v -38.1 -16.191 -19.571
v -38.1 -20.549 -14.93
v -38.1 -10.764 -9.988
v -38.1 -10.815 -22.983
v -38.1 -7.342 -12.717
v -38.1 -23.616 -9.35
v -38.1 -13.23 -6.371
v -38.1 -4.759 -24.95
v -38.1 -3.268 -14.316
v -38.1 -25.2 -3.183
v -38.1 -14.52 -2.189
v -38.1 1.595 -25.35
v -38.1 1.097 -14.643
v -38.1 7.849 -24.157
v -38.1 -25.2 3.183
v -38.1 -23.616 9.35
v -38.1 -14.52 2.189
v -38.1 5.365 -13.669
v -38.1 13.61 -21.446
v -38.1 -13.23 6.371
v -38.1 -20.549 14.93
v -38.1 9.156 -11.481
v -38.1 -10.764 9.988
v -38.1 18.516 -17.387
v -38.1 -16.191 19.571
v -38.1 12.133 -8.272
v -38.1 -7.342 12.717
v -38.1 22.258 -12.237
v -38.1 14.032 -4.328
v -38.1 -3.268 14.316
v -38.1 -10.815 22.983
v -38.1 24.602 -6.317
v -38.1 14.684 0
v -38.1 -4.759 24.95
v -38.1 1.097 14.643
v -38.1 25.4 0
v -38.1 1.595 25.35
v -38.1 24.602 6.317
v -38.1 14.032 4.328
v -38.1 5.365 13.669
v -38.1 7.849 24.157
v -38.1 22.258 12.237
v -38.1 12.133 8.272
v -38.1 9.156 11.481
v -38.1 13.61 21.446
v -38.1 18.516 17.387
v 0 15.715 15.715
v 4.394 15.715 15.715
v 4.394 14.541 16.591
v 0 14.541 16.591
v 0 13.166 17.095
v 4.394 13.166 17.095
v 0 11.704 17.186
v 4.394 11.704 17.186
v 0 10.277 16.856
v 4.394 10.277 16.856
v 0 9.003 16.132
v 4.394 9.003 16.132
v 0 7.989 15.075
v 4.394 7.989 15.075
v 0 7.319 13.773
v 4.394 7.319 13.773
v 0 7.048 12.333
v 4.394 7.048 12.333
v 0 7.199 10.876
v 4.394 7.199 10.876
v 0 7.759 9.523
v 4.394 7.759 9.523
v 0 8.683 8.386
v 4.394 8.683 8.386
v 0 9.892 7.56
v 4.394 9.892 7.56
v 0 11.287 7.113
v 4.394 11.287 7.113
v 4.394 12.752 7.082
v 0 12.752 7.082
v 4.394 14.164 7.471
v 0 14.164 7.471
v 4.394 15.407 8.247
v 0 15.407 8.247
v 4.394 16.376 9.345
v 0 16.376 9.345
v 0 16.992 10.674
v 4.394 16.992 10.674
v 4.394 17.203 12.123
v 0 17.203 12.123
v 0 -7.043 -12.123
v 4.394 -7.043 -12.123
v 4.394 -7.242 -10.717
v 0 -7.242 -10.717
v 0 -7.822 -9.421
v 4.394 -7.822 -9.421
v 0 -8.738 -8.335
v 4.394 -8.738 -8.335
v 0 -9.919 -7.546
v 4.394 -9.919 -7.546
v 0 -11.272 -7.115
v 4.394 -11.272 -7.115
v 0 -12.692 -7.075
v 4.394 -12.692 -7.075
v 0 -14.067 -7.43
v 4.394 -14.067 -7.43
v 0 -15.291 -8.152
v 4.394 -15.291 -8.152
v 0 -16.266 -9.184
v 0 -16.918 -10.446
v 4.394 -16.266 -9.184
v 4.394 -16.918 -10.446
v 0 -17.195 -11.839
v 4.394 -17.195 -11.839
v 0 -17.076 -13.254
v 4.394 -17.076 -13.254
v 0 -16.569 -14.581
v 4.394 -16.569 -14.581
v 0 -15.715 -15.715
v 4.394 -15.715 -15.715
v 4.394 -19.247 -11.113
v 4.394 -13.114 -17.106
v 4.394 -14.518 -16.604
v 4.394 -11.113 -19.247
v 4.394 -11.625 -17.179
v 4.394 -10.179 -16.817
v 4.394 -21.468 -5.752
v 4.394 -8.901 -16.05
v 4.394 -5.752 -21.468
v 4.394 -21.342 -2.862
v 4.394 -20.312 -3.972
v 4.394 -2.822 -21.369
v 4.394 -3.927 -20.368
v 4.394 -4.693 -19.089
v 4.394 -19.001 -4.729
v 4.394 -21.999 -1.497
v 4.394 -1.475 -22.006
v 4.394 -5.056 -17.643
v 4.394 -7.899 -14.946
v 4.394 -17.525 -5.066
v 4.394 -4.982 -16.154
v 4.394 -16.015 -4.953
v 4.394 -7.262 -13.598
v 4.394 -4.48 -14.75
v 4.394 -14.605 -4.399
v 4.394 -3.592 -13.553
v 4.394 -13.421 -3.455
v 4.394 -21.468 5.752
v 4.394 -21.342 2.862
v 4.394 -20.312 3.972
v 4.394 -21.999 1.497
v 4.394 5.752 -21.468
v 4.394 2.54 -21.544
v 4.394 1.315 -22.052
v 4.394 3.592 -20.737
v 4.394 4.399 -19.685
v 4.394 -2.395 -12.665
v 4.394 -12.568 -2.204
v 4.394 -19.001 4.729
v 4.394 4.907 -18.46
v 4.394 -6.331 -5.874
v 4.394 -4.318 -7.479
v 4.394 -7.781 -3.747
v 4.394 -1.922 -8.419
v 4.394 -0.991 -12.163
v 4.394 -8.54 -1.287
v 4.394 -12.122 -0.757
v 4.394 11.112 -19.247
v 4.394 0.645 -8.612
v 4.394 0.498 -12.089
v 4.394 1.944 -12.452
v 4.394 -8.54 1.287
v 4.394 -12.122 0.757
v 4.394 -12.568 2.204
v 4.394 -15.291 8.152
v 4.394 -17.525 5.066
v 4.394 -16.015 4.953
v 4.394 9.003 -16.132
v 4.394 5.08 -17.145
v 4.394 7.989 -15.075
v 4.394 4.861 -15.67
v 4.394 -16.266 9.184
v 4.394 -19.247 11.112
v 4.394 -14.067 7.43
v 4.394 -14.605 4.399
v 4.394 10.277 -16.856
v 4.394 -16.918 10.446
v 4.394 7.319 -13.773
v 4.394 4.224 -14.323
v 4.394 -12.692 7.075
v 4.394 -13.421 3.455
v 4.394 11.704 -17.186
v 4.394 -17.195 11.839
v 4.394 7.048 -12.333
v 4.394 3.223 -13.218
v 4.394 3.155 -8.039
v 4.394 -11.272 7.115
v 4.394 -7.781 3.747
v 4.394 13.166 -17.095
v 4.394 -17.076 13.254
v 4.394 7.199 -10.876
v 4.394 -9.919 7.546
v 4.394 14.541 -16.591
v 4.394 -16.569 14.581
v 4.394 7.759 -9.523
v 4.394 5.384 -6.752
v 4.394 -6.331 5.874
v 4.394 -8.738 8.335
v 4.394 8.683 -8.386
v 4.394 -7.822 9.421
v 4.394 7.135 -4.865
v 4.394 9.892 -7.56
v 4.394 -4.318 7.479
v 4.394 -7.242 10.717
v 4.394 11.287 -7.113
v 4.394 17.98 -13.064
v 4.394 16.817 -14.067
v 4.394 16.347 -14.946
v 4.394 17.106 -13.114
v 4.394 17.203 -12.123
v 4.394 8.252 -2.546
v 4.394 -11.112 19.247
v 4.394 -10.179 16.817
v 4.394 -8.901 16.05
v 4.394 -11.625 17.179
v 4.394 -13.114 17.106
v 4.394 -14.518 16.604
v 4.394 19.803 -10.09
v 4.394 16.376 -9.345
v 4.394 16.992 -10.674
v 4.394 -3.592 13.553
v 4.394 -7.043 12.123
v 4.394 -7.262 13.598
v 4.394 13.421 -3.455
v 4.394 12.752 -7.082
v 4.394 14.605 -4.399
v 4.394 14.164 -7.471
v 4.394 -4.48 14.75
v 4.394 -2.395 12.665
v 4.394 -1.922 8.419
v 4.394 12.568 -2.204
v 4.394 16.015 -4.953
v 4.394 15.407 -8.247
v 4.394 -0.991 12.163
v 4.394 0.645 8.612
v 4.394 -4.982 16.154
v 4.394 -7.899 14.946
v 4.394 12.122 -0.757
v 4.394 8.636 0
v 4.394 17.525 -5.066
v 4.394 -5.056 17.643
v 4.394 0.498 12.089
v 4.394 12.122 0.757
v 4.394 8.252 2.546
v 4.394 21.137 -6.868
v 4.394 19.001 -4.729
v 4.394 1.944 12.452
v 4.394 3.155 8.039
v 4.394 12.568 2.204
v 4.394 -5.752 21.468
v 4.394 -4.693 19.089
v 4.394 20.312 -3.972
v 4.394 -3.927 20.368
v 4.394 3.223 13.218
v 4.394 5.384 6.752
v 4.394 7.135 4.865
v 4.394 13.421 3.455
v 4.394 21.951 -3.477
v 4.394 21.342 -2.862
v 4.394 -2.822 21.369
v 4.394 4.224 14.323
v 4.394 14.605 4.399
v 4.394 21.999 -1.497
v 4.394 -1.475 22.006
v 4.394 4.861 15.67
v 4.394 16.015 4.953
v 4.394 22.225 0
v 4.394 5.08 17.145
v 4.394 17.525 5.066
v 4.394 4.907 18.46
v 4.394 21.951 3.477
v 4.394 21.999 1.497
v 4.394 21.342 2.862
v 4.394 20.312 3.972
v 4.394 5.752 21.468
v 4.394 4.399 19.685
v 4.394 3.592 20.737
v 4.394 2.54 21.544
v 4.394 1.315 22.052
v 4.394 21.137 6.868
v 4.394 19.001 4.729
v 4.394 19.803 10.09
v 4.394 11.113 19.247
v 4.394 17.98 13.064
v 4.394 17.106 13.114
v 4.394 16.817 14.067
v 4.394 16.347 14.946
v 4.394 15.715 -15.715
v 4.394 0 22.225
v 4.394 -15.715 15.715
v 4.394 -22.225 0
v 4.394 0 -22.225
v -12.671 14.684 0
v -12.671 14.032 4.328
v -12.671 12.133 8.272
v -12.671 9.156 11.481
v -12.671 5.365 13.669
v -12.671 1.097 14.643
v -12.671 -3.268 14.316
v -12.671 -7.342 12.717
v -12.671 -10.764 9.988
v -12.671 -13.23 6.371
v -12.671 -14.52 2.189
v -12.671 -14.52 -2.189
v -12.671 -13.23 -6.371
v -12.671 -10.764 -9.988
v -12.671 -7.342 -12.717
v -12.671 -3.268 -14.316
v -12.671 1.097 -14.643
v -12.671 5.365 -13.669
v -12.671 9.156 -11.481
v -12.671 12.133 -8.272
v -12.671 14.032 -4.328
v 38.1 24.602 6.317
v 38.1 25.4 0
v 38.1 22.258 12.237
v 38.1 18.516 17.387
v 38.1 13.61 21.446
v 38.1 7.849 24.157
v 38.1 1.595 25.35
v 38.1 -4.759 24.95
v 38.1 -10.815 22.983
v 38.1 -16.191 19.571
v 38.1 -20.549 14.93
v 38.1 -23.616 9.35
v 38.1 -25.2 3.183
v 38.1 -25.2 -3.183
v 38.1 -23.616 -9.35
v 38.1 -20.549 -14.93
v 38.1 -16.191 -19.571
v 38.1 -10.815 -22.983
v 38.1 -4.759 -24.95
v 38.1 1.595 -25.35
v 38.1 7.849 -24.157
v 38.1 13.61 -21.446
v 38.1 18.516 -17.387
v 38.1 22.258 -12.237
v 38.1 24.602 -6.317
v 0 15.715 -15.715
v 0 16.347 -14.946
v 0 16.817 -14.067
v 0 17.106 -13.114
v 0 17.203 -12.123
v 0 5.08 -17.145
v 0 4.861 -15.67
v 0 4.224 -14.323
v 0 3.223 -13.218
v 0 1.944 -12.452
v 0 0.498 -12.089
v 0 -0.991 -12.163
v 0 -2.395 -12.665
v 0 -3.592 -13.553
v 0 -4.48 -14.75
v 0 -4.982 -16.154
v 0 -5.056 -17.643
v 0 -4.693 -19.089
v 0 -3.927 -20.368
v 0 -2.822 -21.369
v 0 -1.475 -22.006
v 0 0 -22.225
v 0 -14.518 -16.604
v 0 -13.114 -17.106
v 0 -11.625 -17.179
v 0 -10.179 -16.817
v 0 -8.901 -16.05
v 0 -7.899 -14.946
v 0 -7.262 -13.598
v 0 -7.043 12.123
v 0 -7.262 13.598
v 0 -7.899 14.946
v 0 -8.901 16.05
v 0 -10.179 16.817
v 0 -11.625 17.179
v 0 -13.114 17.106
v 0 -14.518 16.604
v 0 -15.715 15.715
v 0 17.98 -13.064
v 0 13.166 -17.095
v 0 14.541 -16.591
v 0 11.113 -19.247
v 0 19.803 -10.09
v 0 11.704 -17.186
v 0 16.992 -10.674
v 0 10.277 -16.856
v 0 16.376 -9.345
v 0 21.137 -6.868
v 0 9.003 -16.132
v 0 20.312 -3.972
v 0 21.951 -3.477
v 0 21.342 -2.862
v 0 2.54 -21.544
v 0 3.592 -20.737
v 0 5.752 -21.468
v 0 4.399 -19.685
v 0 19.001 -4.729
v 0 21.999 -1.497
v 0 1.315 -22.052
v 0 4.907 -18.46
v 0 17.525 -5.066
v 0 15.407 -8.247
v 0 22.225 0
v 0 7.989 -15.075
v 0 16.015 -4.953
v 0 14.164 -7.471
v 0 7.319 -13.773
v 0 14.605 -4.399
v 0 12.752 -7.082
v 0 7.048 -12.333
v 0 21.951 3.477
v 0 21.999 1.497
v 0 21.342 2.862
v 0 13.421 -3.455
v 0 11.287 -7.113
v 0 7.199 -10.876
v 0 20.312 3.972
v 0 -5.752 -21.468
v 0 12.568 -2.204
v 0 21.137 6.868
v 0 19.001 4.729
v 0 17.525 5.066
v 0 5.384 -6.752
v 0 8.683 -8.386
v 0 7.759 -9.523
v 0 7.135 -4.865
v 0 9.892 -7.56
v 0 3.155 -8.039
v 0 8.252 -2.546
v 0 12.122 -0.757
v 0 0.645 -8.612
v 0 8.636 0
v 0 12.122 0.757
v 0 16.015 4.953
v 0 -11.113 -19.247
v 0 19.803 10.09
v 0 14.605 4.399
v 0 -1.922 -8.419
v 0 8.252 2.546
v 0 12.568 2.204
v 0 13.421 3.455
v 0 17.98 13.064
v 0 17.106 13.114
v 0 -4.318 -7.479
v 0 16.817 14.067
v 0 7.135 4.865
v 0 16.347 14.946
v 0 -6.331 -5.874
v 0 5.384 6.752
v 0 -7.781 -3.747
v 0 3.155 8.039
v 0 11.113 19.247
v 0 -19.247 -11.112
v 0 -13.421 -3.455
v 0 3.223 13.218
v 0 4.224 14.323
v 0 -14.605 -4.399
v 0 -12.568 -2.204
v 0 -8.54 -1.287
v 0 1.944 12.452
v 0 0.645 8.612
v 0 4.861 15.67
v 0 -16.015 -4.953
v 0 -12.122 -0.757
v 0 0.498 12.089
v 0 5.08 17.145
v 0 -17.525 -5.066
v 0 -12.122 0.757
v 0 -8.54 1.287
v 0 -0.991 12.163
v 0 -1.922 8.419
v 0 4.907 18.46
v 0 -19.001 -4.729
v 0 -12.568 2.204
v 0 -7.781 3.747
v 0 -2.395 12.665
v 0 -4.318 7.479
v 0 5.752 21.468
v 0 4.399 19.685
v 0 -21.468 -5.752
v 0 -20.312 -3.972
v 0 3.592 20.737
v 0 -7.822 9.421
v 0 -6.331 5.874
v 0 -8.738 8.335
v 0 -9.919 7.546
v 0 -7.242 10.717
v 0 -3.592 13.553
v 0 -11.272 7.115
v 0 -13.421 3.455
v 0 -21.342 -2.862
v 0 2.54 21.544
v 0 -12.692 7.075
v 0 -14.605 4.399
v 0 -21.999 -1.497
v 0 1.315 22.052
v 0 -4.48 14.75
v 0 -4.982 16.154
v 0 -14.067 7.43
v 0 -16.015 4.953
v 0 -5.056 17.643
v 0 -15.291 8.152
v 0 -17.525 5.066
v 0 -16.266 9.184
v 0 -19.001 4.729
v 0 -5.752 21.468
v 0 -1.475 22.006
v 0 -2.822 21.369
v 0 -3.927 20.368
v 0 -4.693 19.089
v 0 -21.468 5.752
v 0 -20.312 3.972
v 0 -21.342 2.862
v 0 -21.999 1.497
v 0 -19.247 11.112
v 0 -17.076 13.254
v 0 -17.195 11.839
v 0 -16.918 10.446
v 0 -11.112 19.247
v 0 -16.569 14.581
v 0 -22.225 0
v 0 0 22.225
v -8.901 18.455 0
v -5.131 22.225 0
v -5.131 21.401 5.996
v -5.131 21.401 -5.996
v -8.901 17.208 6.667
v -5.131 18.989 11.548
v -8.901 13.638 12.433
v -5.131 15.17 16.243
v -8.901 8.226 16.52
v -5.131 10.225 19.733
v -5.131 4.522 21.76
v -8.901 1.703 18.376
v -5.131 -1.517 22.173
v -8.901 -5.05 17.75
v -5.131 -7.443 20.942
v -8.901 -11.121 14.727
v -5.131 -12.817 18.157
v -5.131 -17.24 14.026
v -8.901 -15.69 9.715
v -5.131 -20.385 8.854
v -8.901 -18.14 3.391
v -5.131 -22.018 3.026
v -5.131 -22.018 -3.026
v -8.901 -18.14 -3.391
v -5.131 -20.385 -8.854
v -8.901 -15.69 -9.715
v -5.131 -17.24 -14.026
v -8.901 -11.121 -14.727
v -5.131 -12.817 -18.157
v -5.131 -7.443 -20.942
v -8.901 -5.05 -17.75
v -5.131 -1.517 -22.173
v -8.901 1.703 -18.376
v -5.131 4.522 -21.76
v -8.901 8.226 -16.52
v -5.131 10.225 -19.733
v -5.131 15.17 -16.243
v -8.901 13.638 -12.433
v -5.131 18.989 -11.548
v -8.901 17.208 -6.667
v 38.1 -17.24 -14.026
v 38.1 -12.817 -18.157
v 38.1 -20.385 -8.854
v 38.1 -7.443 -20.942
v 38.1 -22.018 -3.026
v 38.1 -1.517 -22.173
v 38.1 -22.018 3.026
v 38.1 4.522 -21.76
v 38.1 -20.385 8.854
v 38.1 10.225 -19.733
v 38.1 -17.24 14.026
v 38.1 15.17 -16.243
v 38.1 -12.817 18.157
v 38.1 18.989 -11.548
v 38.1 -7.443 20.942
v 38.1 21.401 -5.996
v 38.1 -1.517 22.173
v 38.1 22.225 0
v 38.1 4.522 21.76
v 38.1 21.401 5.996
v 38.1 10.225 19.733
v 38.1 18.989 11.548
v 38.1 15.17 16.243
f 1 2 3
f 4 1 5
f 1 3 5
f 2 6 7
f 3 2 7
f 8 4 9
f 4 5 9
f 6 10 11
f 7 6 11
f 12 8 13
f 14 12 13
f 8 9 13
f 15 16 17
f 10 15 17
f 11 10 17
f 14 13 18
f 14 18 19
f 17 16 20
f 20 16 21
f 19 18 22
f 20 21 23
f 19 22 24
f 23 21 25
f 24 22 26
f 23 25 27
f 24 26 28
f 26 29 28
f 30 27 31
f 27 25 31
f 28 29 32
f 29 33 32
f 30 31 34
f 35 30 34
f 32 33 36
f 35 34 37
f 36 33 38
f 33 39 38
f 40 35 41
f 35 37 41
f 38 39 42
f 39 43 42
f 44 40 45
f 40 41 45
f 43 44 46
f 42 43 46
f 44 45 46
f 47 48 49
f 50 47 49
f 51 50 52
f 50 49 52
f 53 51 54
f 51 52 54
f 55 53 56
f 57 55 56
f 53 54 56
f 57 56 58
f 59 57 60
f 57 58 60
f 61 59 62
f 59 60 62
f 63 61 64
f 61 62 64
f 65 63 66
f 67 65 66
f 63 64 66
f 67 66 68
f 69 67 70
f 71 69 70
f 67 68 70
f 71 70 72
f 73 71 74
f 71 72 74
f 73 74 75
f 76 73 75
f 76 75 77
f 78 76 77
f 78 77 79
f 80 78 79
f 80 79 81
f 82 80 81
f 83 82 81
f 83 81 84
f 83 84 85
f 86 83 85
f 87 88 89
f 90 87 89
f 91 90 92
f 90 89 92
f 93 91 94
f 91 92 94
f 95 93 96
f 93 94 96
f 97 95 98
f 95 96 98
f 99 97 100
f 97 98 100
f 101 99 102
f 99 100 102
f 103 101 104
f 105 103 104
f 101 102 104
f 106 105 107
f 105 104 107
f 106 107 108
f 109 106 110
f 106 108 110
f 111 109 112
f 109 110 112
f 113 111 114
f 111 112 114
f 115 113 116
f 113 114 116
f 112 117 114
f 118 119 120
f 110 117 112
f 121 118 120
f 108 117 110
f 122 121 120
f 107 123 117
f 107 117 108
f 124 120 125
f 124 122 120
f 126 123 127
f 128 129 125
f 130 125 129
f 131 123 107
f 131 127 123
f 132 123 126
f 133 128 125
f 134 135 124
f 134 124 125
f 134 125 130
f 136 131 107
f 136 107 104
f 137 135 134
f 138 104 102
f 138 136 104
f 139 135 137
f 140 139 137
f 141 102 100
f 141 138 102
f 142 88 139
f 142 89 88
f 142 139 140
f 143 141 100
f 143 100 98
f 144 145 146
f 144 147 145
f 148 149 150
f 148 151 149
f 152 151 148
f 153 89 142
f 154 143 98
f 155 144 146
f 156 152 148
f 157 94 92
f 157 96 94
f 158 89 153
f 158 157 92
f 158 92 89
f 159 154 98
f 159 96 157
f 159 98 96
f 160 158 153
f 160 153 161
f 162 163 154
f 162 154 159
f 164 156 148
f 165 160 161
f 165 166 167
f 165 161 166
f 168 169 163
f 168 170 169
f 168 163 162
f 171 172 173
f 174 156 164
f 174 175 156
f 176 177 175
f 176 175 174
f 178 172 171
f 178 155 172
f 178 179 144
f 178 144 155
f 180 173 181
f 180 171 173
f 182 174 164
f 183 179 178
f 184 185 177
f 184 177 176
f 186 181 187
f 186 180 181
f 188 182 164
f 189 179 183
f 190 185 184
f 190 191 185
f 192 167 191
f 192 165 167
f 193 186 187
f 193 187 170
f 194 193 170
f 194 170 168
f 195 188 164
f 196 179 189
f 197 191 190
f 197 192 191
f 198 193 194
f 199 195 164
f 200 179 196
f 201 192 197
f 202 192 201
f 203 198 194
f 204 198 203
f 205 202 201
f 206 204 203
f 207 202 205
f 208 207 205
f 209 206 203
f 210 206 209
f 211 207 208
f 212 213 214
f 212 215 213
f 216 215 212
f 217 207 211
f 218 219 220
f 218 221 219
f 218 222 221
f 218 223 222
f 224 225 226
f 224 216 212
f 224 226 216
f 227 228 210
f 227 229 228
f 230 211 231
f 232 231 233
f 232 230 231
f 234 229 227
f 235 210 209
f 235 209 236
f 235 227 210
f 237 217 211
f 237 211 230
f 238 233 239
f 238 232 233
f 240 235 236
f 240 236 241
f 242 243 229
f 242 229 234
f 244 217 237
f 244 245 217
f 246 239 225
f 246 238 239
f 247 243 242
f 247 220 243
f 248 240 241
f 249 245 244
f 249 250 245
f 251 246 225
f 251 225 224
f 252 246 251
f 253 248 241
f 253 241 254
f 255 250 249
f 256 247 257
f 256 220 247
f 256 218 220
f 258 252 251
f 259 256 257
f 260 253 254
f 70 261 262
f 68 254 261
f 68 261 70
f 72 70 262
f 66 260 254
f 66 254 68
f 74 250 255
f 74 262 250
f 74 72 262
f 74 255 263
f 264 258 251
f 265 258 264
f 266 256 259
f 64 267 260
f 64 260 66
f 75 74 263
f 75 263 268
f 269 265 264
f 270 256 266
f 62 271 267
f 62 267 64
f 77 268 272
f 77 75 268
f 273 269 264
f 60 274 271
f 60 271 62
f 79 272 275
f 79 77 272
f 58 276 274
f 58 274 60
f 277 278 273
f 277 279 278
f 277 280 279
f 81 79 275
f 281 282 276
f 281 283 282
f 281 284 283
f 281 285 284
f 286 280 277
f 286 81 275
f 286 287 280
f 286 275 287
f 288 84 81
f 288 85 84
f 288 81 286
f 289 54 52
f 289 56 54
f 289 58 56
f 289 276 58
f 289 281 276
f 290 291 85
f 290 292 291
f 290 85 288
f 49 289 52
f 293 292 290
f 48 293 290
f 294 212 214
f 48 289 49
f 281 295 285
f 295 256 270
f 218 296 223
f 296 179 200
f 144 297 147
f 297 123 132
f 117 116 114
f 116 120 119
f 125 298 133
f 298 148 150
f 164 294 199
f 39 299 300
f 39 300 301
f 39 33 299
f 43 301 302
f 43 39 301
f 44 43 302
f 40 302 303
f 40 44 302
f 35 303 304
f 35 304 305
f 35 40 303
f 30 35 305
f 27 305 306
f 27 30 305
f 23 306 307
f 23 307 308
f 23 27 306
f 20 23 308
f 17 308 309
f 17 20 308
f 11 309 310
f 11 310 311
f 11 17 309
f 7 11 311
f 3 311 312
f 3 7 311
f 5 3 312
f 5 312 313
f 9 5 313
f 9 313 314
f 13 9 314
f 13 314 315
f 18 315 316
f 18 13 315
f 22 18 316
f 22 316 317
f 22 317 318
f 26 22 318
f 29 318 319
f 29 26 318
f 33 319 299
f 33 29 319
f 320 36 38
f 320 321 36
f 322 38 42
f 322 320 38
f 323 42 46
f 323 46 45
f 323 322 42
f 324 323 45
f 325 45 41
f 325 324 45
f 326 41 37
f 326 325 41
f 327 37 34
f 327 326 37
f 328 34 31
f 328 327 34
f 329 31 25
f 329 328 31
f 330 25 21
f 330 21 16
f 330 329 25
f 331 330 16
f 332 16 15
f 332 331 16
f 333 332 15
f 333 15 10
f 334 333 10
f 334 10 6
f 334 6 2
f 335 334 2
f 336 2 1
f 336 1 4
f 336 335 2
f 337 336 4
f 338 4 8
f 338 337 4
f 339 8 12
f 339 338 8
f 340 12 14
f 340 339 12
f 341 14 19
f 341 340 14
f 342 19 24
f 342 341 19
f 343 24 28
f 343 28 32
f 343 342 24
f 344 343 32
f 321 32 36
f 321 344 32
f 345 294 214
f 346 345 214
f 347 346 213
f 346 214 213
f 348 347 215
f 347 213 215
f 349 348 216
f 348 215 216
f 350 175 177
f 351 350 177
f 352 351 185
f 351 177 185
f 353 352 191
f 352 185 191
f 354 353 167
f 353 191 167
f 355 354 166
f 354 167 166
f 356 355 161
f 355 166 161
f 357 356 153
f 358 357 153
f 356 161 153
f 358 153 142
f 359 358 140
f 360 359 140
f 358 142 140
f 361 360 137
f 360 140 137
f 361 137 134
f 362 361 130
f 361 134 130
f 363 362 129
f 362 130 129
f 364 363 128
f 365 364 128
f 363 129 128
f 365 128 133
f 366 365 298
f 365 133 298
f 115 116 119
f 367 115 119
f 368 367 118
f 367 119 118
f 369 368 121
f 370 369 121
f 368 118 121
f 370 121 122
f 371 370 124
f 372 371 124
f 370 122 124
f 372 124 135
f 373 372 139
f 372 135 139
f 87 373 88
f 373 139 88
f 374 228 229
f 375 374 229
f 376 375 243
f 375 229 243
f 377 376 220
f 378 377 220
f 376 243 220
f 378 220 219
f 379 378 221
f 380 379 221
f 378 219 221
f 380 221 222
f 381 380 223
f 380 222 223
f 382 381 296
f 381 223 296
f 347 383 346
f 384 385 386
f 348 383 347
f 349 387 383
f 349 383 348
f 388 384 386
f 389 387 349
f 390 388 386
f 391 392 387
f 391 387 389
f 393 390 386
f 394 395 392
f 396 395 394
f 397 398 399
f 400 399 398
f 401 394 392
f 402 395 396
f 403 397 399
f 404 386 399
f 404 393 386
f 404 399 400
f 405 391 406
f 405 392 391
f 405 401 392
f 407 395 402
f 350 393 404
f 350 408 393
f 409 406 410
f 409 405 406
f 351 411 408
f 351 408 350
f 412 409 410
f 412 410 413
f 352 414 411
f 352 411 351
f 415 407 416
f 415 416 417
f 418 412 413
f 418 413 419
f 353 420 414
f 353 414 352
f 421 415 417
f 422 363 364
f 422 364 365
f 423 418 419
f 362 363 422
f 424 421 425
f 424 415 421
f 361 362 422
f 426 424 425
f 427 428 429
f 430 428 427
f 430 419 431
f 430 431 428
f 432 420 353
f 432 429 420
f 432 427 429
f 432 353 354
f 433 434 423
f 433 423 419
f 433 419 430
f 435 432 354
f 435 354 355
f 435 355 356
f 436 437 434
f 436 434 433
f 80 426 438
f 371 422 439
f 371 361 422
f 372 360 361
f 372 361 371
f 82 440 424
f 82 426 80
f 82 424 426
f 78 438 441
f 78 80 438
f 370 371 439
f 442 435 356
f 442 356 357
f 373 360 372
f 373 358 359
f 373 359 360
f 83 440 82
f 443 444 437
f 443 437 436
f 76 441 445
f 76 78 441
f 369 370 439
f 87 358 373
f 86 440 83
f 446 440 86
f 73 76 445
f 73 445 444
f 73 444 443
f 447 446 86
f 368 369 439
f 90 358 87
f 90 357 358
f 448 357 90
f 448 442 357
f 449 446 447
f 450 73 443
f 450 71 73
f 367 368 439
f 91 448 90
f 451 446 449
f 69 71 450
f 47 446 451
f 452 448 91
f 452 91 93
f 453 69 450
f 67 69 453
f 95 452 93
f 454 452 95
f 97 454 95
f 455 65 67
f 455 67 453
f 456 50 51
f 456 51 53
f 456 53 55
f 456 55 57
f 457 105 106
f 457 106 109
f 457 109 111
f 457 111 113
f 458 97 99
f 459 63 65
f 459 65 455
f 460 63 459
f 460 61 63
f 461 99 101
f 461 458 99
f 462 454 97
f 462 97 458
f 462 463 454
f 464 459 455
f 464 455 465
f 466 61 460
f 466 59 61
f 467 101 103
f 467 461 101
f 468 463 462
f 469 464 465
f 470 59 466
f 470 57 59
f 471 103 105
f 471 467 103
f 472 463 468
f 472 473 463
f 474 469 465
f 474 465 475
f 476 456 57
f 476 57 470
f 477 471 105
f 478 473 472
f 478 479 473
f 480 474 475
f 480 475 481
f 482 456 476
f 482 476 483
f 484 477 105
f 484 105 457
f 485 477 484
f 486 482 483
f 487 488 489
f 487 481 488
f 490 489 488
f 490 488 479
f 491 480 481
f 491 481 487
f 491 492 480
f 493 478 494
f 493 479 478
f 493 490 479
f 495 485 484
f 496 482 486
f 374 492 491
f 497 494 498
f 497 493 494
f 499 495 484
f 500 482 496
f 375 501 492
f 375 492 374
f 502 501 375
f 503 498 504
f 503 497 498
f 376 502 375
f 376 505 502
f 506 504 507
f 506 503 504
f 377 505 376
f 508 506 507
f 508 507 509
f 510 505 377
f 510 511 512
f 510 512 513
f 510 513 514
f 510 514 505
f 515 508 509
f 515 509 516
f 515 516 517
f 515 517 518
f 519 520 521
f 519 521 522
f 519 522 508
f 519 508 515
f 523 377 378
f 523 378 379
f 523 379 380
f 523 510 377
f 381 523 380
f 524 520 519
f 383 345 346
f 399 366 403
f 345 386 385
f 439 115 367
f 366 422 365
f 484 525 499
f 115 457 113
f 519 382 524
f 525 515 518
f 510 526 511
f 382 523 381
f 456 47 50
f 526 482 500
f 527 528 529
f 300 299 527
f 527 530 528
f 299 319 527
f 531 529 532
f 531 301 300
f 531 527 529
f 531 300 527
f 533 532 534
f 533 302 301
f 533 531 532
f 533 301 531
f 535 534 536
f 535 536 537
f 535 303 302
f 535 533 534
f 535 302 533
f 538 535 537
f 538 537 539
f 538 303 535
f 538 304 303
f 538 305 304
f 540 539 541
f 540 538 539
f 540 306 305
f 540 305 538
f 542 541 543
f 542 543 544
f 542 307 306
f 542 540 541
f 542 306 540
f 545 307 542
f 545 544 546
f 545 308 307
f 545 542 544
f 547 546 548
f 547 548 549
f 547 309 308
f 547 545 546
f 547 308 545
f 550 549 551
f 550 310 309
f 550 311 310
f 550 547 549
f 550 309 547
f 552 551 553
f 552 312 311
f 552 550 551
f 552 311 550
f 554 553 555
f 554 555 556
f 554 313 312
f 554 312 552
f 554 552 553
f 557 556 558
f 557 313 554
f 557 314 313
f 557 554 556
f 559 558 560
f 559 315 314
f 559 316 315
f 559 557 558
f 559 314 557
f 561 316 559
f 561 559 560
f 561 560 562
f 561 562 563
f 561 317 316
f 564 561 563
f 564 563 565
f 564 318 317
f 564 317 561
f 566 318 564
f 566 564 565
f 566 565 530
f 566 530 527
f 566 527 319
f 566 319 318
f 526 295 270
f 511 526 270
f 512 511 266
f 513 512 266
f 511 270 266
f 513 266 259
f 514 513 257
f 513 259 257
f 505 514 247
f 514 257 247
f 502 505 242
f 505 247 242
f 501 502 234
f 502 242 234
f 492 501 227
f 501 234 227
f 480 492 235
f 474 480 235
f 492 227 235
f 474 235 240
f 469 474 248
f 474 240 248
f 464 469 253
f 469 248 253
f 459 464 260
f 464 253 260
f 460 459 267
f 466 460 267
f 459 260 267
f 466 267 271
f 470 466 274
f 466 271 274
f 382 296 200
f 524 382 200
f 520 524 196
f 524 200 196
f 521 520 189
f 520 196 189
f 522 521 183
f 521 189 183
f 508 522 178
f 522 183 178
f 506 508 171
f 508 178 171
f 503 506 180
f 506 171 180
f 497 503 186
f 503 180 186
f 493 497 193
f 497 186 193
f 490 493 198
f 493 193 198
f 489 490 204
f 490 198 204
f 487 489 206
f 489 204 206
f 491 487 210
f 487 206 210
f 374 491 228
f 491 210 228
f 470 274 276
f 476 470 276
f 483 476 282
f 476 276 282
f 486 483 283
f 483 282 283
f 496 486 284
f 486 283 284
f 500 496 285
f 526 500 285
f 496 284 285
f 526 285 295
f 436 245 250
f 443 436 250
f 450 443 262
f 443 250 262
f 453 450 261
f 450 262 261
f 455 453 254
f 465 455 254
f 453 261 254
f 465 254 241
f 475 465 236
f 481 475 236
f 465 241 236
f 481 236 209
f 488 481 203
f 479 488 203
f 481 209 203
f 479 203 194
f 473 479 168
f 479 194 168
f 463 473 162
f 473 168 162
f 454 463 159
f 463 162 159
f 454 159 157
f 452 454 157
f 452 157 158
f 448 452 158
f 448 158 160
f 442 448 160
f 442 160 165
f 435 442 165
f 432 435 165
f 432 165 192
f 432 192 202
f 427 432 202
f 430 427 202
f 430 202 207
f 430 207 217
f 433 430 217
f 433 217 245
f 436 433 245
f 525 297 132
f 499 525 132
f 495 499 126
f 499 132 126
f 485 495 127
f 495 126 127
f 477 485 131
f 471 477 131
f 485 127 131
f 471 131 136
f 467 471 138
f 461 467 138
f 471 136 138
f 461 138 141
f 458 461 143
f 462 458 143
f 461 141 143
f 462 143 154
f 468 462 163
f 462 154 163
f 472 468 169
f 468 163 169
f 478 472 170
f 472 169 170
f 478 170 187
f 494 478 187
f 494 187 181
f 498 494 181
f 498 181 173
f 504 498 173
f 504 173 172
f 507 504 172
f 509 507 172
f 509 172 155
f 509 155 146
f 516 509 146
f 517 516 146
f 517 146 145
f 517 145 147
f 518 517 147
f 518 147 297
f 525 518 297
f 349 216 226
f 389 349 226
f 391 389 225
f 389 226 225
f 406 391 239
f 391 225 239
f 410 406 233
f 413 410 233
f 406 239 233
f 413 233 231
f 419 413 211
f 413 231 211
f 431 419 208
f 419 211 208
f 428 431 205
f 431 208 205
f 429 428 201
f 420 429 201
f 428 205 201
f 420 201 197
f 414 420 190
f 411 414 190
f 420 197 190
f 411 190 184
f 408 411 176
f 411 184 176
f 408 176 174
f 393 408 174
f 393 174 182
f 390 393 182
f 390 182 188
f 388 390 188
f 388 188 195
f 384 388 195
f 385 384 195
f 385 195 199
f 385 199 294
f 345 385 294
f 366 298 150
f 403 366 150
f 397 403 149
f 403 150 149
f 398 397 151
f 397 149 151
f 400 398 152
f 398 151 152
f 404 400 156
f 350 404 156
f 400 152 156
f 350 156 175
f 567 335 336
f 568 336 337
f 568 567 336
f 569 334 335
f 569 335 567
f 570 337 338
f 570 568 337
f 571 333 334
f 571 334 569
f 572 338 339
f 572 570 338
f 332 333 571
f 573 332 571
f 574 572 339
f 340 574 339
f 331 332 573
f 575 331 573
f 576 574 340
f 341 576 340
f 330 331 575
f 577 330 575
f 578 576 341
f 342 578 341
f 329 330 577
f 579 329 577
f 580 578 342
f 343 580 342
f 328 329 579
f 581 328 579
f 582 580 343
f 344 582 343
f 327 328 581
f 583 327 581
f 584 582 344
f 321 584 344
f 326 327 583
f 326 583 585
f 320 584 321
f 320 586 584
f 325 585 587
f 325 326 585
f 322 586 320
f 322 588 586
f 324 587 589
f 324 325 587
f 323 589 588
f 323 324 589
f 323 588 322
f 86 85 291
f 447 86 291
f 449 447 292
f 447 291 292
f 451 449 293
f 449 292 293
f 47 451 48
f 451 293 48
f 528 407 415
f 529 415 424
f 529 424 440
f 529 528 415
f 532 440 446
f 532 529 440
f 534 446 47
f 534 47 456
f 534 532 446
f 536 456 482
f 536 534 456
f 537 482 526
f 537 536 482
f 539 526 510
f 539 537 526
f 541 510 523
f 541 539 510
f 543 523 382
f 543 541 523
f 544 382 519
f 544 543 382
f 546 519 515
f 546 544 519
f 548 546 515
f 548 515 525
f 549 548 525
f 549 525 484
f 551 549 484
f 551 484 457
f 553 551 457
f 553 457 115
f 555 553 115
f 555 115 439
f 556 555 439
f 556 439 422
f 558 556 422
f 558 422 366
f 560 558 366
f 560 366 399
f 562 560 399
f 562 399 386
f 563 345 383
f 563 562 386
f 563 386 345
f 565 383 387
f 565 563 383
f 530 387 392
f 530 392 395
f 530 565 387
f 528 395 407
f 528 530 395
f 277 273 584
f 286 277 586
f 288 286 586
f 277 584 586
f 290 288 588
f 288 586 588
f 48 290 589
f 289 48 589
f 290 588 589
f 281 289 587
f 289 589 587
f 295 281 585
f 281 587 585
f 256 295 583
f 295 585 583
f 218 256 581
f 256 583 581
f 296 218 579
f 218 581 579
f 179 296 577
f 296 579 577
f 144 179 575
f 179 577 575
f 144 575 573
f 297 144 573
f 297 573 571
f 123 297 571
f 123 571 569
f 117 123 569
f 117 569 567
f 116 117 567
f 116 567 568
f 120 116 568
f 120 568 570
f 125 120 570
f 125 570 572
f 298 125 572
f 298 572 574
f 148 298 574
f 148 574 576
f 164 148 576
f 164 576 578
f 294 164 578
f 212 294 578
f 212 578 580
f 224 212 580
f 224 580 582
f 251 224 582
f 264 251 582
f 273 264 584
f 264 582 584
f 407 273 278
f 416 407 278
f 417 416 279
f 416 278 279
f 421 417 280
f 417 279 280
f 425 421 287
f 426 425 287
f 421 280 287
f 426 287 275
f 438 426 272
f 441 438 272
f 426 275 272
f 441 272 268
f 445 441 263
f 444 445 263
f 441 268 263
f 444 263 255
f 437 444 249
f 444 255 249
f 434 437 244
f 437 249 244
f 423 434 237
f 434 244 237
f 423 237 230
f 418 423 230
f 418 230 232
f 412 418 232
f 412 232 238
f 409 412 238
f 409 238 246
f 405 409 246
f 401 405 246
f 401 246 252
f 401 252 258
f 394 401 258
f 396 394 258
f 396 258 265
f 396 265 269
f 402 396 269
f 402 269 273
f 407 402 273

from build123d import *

# Parameters (mm, degrees)
F0_R     = 25.4
F1_DEPTH = 38.1
F2_R     = 22.225
F3_DEPTH = 33.7058
F4_R     = 5.08
F4_R_2   = 8.636
F5_DEPTH = 9.525


with BuildPart() as f1:
    # F0 (on Right) → F1 (new body, symmetric)
    with BuildSketch(Plane.YZ):
        Circle(F0_R)
    extrude(amount=F1_DEPTH, both=True)

    # F2 (on face) → F3 (cut)
    with BuildSketch(Plane.YZ.offset(38.1)):
        Circle(F2_R)
    extrude(amount=-F3_DEPTH, mode=Mode.SUBTRACT)

    # F4 (on face) → F5 (cut)
    with BuildSketch(Plane.YZ.offset(4.3942)):
        with BuildLine():
            ThreePointArc((-7.043346, 12.123346), (-10.179314, 16.816654), (-15.715448, 15.715448))
            ThreePointArc((-15.715448, 15.715448), (-14.067378, 7.430038), (-7.043346, 12.123346))
        make_face()
        with BuildLine():
            ThreePointArc((-12.065, 0), (-17.145, 5.08), (-22.225, 0))
            ThreePointArc((-22.225, 0), (-17.145, -5.08), (-12.065, 0))
        make_face()
        with BuildLine():
            ThreePointArc((-7.043346, -12.123346), (-14.067378, -7.430038), (-15.715448, -15.715448))
            ThreePointArc((-15.715448, -15.715448), (-10.179314, -16.816654), (-7.043346, -12.123346))
        make_face()
        with BuildLine():
            ThreePointArc((5.08, -17.145), (-3.592102, -13.552898), (0, -22.225))
            ThreePointArc((0, -22.225), (3.592102, -20.737102), (5.08, -17.145))
        make_face()
        with BuildLine():
            ThreePointArc((17.203346, -12.123346), (7.430038, -10.179314), (15.715448, -15.715448))
            ThreePointArc((15.715448, -15.715448), (16.816654, -14.067378), (17.203346, -12.123346))
        make_face()
        with Locations((17.145, 0)):
            Circle(F4_R)
        with BuildLine():
            ThreePointArc((17.203346, 12.123346), (16.816654, 14.067378), (15.715448, 15.715448))
            ThreePointArc((15.715448, 15.715448), (7.430038, 10.179314), (17.203346, 12.123346))
        make_face()
        with BuildLine():
            ThreePointArc((0, 22.225), (-3.592102, 13.552898), (5.08, 17.145))
            ThreePointArc((5.08, 17.145), (3.592102, 20.737102), (0, 22.225))
        make_face()
        Circle(F4_R_2)
    extrude(amount=-F5_DEPTH, mode=Mode.SUBTRACT)

    # F6 (on Top) → F7 (revolve, cut)
    with BuildSketch(Plane.XY):
        Polygon((0, 22.225), (-5.1308, 22.225), (-12.671425, 14.684375), (-38.1, 14.684375), (-38.1, 0), (0, 0), align=None)
    revolve(axis=Axis((0, 0, 0), (1, 0, 0)), mode=Mode.SUBTRACT)


solid = f1.part
